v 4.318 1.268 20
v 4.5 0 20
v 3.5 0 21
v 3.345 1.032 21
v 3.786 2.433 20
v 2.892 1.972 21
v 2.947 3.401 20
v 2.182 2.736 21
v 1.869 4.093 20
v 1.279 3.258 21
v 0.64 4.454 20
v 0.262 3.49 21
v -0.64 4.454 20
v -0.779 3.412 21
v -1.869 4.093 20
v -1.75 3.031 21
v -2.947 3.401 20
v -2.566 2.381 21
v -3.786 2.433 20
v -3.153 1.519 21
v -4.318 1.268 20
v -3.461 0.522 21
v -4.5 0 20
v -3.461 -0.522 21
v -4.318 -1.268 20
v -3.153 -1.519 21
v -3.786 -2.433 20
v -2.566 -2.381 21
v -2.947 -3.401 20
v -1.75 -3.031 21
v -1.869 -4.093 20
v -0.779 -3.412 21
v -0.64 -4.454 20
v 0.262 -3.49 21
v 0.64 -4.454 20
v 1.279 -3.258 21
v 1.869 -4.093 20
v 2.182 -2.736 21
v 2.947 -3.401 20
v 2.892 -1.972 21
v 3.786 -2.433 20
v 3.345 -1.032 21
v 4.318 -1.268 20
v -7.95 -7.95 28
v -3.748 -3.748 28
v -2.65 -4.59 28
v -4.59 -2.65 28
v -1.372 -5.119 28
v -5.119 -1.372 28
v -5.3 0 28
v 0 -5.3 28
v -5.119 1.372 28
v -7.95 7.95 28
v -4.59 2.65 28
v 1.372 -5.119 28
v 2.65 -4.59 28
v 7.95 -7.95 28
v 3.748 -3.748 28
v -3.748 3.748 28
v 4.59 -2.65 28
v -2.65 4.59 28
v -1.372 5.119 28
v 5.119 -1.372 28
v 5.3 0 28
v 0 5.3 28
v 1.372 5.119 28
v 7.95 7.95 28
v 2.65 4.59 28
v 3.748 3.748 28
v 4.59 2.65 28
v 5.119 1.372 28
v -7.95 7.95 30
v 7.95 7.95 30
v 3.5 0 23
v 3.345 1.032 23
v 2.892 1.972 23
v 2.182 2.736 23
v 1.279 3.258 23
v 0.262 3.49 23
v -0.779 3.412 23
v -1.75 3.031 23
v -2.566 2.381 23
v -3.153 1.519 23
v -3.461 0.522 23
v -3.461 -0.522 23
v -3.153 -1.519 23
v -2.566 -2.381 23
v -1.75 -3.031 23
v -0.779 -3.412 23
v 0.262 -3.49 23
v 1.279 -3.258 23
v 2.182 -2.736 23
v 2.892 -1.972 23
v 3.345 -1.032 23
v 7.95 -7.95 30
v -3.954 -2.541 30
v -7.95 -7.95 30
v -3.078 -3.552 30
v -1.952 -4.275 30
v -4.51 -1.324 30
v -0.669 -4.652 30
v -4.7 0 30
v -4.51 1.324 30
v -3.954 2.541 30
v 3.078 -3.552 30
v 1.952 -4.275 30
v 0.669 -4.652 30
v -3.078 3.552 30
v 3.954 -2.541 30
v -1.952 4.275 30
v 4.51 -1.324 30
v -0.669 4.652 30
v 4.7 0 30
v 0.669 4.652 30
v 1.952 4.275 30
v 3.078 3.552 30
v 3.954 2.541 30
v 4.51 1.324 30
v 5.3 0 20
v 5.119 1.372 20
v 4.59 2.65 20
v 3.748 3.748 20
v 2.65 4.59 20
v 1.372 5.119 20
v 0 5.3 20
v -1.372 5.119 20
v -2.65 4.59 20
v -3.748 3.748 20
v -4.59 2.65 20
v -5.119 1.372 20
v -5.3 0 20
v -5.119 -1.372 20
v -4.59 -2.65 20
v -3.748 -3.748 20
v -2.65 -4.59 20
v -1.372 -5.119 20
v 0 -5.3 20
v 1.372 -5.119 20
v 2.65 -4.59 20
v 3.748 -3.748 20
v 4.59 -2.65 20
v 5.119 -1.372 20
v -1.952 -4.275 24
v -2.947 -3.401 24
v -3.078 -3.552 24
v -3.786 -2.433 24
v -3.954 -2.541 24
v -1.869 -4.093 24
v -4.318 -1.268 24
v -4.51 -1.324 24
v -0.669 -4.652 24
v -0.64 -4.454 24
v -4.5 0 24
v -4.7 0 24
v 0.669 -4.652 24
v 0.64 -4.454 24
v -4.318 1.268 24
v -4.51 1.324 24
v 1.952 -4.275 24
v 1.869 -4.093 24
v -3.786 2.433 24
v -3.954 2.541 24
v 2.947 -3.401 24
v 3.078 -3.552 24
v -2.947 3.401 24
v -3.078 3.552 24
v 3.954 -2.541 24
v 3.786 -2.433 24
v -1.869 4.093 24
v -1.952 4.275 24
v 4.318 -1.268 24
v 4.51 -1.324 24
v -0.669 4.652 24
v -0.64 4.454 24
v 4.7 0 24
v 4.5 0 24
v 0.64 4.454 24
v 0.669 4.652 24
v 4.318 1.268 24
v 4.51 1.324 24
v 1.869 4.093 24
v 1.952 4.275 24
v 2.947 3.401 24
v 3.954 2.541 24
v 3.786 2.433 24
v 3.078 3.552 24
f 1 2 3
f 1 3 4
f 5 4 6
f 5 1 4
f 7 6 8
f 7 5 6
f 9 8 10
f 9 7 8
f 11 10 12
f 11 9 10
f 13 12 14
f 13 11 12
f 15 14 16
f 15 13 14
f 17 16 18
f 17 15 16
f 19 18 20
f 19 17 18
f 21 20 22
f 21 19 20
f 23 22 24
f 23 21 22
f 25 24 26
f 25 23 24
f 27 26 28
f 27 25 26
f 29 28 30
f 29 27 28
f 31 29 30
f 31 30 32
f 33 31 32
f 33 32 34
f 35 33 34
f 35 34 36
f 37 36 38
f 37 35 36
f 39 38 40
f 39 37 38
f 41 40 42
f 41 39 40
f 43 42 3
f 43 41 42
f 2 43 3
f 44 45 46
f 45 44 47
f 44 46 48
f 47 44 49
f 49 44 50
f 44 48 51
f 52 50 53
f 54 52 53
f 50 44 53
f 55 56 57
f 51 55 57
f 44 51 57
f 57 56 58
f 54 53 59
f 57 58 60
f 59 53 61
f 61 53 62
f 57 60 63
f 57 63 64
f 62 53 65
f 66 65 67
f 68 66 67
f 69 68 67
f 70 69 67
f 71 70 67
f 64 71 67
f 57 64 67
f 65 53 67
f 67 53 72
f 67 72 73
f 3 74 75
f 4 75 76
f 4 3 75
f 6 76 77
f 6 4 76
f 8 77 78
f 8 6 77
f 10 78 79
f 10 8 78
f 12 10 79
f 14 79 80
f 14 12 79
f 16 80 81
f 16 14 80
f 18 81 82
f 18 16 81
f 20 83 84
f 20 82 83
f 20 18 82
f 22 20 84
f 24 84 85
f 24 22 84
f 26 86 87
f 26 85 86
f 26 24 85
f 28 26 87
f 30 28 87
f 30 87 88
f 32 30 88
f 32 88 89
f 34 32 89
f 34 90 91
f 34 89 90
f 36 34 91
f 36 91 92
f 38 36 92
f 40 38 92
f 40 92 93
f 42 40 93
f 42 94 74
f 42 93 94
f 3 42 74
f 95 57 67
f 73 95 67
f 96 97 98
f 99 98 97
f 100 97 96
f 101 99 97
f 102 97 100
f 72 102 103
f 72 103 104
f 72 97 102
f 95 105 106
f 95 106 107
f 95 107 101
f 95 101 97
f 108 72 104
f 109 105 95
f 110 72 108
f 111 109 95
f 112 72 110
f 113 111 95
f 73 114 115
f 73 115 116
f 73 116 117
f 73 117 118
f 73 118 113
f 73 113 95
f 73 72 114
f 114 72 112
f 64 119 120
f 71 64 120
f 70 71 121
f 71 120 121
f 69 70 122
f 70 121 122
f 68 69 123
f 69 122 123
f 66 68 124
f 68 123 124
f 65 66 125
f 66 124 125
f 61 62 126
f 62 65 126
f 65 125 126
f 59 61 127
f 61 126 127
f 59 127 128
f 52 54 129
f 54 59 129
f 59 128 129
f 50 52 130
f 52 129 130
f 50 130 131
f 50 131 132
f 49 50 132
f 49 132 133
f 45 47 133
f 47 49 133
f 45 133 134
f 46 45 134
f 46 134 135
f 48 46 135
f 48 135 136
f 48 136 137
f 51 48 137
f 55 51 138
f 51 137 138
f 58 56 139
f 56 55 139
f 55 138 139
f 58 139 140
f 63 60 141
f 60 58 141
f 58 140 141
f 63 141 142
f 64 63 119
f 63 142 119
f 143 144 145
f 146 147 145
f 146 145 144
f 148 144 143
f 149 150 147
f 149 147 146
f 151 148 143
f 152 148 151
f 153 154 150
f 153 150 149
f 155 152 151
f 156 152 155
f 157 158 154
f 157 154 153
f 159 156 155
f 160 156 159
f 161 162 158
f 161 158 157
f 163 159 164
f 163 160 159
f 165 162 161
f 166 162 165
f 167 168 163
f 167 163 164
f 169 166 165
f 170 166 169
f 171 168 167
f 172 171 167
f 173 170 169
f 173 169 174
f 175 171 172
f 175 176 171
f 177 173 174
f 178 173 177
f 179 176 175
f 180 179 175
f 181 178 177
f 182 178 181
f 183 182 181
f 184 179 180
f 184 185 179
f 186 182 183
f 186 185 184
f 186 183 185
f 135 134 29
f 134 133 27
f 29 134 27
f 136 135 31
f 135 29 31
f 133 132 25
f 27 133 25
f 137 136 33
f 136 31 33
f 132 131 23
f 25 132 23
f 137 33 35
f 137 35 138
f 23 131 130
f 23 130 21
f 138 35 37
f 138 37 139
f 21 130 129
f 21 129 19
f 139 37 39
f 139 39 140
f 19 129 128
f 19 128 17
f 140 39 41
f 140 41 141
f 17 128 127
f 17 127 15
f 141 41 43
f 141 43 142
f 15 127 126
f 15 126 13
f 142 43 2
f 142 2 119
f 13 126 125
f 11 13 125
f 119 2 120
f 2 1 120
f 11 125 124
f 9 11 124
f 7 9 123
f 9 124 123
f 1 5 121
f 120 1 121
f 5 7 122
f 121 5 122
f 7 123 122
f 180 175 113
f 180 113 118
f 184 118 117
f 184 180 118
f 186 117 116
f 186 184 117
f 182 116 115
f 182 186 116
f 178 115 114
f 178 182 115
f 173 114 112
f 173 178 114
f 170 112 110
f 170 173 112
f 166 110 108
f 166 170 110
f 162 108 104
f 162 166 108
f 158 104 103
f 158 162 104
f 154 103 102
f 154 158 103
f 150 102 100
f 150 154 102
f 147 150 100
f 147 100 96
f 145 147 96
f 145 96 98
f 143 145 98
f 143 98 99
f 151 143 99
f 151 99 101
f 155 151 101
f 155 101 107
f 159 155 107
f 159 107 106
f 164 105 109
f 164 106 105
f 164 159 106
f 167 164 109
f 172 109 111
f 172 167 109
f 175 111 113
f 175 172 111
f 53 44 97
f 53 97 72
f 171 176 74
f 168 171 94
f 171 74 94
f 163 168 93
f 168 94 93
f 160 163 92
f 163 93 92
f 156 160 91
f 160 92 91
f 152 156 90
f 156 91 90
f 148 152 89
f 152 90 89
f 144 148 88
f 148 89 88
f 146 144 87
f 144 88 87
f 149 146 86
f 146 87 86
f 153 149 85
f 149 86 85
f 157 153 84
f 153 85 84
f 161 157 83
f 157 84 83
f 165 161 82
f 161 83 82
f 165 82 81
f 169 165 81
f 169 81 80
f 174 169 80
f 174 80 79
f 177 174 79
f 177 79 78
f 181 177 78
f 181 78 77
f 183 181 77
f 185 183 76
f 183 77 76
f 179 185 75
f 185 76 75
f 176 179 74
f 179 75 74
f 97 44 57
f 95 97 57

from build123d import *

# Parameters (mm, degrees)
CYLINDER010_R     = 4.7
CYLINDER010_DEPTH = 10
CYLINDER009_R     = 3.5
CYLINDER009_DEPTH = 10
BOX004_W          = 15.9
BOX004_H          = 15.9
BOX004_DEPTH      = 2
CYLINDER008_R     = 5.3
CYLINDER008_DEPTH = 10
CHAMFER_SIZE      = 1
CHAMFER001_SIZE   = 1


with BuildPart() as lochschraubeoben:
    # Cylinder010 → Cylinder010 (new body)
    with BuildSketch(Plane.XY.offset(24)):
        Circle(CYLINDER010_R)
    extrude(amount=CYLINDER010_DEPTH)


with BuildPart() as zylinder:
    # Cylinder009 → Cylinder009 (new body)
    with BuildSketch(Plane.XY.offset(20)):
        Circle(CYLINDER009_R)
    extrude(amount=CYLINDER009_DEPTH)


with BuildPart() as w_rfel:
    # Box004 → Box004 (new body)
    with BuildSketch(Plane(origin=(-7.95, -7.95, 28), x_dir=(1, 0, 0), z_dir=(0, 0, 1))):
        with Locations((7.95, 7.95)):
            Rectangle(BOX004_W, BOX004_H)
    extrude(amount=BOX004_DEPTH)


with BuildPart() as bolt:
    # Cylinder008 → Cylinder008 (new body)
    with BuildSketch(Plane.XY.offset(20)):
        Circle(CYLINDER008_R)
    extrude(amount=CYLINDER008_DEPTH)

    # Fusion004: union Würfel
    add(w_rfel.part)

    # Cut003: cut Zylinder
    add(zylinder.part, mode=Mode.SUBTRACT)

    # Cut004: cut LochSchraubeOben
    add(lochschraubeoben.part, mode=Mode.SUBTRACT)

    # Chamfer
    chamfer_edges = [bolt.edges().sort_by_distance(p)[0] for p in [
        (-3.5, 0, 24),
    ]]
    chamfer(chamfer_edges, length=CHAMFER_SIZE)

    # Chamfer001
    chamfer001_edges = [bolt.edges().sort_by_distance(p)[0] for p in [
        (-3.5, 0, 20),
    ]]
    chamfer(chamfer001_edges, length=CHAMFER001_SIZE)


solid = bolt.part
